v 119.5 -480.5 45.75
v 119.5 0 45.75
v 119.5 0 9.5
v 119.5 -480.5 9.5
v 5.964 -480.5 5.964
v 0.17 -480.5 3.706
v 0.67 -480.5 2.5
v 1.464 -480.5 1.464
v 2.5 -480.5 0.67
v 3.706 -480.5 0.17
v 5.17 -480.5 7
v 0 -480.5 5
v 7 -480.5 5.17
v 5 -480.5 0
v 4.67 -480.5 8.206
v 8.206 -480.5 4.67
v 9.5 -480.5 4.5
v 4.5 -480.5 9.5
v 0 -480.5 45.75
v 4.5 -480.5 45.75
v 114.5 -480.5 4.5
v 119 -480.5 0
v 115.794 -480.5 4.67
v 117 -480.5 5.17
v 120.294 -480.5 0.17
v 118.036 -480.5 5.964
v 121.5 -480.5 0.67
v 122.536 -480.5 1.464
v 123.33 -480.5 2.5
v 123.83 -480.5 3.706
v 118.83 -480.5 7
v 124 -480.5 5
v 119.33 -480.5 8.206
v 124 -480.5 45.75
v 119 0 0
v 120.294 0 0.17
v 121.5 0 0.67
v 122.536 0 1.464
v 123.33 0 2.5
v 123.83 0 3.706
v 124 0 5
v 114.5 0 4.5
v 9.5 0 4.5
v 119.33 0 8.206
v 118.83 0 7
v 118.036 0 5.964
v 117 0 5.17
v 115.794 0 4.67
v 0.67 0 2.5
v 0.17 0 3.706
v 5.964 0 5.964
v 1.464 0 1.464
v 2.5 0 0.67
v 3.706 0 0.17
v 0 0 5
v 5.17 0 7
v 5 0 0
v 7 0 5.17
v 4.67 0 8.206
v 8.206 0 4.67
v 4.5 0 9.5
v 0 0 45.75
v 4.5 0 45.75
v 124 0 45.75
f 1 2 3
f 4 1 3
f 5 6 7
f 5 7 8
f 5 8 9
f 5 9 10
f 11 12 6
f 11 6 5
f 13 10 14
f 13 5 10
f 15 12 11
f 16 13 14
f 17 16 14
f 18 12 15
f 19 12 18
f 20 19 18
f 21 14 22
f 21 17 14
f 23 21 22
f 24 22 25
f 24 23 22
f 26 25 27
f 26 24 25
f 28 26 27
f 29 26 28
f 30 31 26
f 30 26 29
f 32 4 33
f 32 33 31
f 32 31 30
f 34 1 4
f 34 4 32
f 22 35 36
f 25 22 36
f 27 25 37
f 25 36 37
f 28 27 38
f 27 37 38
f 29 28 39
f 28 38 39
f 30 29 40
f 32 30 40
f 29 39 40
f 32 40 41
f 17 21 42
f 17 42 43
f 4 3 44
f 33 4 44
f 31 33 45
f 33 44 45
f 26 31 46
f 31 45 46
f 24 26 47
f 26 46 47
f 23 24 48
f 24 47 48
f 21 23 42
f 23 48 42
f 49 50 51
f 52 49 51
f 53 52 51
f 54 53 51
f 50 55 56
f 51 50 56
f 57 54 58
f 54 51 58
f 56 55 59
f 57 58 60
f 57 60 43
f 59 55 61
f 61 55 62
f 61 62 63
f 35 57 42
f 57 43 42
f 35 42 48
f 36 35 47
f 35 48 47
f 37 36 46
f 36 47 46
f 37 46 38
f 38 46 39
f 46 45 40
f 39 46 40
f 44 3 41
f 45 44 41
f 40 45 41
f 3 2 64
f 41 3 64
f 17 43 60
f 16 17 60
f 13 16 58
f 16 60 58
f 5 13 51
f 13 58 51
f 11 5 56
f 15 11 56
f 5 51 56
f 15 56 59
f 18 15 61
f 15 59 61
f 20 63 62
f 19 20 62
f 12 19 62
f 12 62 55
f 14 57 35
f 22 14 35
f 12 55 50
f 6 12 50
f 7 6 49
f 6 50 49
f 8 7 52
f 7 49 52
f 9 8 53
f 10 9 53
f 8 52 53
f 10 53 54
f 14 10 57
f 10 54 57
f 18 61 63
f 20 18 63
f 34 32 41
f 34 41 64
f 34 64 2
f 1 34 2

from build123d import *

# Parameters (mm, degrees)
F1_DEPTH = 480.5


with BuildPart() as f1:
    # F0 (on Front) → F1 (new body)
    with BuildSketch(Plane.XZ):
        with BuildLine():
            ThreePointArc((0, 5), (1.464466, 1.464466), (5, 0))
            Line((5, 0), (119, 0))
            ThreePointArc((119, 0), (122.535534, 1.464466), (124, 5))
            Line((124, 5), (124, 45.75))
            Line((124, 45.75), (119.5, 45.75))
            Line((119.5, 45.75), (119.5, 9.5))
            ThreePointArc((119.5, 9.5), (118.035534, 5.964466), (114.5, 4.5))
            Line((114.5, 4.5), (9.5, 4.5))
            ThreePointArc((9.5, 4.5), (5.964466, 5.964466), (4.5, 9.5))
            Line((4.5, 9.5), (4.5, 45.75))
            Line((4.5, 45.75), (0, 45.75))
            Line((0, 45.75), (0, 5))
        make_face()
    extrude(amount=F1_DEPTH)


solid = f1.part
